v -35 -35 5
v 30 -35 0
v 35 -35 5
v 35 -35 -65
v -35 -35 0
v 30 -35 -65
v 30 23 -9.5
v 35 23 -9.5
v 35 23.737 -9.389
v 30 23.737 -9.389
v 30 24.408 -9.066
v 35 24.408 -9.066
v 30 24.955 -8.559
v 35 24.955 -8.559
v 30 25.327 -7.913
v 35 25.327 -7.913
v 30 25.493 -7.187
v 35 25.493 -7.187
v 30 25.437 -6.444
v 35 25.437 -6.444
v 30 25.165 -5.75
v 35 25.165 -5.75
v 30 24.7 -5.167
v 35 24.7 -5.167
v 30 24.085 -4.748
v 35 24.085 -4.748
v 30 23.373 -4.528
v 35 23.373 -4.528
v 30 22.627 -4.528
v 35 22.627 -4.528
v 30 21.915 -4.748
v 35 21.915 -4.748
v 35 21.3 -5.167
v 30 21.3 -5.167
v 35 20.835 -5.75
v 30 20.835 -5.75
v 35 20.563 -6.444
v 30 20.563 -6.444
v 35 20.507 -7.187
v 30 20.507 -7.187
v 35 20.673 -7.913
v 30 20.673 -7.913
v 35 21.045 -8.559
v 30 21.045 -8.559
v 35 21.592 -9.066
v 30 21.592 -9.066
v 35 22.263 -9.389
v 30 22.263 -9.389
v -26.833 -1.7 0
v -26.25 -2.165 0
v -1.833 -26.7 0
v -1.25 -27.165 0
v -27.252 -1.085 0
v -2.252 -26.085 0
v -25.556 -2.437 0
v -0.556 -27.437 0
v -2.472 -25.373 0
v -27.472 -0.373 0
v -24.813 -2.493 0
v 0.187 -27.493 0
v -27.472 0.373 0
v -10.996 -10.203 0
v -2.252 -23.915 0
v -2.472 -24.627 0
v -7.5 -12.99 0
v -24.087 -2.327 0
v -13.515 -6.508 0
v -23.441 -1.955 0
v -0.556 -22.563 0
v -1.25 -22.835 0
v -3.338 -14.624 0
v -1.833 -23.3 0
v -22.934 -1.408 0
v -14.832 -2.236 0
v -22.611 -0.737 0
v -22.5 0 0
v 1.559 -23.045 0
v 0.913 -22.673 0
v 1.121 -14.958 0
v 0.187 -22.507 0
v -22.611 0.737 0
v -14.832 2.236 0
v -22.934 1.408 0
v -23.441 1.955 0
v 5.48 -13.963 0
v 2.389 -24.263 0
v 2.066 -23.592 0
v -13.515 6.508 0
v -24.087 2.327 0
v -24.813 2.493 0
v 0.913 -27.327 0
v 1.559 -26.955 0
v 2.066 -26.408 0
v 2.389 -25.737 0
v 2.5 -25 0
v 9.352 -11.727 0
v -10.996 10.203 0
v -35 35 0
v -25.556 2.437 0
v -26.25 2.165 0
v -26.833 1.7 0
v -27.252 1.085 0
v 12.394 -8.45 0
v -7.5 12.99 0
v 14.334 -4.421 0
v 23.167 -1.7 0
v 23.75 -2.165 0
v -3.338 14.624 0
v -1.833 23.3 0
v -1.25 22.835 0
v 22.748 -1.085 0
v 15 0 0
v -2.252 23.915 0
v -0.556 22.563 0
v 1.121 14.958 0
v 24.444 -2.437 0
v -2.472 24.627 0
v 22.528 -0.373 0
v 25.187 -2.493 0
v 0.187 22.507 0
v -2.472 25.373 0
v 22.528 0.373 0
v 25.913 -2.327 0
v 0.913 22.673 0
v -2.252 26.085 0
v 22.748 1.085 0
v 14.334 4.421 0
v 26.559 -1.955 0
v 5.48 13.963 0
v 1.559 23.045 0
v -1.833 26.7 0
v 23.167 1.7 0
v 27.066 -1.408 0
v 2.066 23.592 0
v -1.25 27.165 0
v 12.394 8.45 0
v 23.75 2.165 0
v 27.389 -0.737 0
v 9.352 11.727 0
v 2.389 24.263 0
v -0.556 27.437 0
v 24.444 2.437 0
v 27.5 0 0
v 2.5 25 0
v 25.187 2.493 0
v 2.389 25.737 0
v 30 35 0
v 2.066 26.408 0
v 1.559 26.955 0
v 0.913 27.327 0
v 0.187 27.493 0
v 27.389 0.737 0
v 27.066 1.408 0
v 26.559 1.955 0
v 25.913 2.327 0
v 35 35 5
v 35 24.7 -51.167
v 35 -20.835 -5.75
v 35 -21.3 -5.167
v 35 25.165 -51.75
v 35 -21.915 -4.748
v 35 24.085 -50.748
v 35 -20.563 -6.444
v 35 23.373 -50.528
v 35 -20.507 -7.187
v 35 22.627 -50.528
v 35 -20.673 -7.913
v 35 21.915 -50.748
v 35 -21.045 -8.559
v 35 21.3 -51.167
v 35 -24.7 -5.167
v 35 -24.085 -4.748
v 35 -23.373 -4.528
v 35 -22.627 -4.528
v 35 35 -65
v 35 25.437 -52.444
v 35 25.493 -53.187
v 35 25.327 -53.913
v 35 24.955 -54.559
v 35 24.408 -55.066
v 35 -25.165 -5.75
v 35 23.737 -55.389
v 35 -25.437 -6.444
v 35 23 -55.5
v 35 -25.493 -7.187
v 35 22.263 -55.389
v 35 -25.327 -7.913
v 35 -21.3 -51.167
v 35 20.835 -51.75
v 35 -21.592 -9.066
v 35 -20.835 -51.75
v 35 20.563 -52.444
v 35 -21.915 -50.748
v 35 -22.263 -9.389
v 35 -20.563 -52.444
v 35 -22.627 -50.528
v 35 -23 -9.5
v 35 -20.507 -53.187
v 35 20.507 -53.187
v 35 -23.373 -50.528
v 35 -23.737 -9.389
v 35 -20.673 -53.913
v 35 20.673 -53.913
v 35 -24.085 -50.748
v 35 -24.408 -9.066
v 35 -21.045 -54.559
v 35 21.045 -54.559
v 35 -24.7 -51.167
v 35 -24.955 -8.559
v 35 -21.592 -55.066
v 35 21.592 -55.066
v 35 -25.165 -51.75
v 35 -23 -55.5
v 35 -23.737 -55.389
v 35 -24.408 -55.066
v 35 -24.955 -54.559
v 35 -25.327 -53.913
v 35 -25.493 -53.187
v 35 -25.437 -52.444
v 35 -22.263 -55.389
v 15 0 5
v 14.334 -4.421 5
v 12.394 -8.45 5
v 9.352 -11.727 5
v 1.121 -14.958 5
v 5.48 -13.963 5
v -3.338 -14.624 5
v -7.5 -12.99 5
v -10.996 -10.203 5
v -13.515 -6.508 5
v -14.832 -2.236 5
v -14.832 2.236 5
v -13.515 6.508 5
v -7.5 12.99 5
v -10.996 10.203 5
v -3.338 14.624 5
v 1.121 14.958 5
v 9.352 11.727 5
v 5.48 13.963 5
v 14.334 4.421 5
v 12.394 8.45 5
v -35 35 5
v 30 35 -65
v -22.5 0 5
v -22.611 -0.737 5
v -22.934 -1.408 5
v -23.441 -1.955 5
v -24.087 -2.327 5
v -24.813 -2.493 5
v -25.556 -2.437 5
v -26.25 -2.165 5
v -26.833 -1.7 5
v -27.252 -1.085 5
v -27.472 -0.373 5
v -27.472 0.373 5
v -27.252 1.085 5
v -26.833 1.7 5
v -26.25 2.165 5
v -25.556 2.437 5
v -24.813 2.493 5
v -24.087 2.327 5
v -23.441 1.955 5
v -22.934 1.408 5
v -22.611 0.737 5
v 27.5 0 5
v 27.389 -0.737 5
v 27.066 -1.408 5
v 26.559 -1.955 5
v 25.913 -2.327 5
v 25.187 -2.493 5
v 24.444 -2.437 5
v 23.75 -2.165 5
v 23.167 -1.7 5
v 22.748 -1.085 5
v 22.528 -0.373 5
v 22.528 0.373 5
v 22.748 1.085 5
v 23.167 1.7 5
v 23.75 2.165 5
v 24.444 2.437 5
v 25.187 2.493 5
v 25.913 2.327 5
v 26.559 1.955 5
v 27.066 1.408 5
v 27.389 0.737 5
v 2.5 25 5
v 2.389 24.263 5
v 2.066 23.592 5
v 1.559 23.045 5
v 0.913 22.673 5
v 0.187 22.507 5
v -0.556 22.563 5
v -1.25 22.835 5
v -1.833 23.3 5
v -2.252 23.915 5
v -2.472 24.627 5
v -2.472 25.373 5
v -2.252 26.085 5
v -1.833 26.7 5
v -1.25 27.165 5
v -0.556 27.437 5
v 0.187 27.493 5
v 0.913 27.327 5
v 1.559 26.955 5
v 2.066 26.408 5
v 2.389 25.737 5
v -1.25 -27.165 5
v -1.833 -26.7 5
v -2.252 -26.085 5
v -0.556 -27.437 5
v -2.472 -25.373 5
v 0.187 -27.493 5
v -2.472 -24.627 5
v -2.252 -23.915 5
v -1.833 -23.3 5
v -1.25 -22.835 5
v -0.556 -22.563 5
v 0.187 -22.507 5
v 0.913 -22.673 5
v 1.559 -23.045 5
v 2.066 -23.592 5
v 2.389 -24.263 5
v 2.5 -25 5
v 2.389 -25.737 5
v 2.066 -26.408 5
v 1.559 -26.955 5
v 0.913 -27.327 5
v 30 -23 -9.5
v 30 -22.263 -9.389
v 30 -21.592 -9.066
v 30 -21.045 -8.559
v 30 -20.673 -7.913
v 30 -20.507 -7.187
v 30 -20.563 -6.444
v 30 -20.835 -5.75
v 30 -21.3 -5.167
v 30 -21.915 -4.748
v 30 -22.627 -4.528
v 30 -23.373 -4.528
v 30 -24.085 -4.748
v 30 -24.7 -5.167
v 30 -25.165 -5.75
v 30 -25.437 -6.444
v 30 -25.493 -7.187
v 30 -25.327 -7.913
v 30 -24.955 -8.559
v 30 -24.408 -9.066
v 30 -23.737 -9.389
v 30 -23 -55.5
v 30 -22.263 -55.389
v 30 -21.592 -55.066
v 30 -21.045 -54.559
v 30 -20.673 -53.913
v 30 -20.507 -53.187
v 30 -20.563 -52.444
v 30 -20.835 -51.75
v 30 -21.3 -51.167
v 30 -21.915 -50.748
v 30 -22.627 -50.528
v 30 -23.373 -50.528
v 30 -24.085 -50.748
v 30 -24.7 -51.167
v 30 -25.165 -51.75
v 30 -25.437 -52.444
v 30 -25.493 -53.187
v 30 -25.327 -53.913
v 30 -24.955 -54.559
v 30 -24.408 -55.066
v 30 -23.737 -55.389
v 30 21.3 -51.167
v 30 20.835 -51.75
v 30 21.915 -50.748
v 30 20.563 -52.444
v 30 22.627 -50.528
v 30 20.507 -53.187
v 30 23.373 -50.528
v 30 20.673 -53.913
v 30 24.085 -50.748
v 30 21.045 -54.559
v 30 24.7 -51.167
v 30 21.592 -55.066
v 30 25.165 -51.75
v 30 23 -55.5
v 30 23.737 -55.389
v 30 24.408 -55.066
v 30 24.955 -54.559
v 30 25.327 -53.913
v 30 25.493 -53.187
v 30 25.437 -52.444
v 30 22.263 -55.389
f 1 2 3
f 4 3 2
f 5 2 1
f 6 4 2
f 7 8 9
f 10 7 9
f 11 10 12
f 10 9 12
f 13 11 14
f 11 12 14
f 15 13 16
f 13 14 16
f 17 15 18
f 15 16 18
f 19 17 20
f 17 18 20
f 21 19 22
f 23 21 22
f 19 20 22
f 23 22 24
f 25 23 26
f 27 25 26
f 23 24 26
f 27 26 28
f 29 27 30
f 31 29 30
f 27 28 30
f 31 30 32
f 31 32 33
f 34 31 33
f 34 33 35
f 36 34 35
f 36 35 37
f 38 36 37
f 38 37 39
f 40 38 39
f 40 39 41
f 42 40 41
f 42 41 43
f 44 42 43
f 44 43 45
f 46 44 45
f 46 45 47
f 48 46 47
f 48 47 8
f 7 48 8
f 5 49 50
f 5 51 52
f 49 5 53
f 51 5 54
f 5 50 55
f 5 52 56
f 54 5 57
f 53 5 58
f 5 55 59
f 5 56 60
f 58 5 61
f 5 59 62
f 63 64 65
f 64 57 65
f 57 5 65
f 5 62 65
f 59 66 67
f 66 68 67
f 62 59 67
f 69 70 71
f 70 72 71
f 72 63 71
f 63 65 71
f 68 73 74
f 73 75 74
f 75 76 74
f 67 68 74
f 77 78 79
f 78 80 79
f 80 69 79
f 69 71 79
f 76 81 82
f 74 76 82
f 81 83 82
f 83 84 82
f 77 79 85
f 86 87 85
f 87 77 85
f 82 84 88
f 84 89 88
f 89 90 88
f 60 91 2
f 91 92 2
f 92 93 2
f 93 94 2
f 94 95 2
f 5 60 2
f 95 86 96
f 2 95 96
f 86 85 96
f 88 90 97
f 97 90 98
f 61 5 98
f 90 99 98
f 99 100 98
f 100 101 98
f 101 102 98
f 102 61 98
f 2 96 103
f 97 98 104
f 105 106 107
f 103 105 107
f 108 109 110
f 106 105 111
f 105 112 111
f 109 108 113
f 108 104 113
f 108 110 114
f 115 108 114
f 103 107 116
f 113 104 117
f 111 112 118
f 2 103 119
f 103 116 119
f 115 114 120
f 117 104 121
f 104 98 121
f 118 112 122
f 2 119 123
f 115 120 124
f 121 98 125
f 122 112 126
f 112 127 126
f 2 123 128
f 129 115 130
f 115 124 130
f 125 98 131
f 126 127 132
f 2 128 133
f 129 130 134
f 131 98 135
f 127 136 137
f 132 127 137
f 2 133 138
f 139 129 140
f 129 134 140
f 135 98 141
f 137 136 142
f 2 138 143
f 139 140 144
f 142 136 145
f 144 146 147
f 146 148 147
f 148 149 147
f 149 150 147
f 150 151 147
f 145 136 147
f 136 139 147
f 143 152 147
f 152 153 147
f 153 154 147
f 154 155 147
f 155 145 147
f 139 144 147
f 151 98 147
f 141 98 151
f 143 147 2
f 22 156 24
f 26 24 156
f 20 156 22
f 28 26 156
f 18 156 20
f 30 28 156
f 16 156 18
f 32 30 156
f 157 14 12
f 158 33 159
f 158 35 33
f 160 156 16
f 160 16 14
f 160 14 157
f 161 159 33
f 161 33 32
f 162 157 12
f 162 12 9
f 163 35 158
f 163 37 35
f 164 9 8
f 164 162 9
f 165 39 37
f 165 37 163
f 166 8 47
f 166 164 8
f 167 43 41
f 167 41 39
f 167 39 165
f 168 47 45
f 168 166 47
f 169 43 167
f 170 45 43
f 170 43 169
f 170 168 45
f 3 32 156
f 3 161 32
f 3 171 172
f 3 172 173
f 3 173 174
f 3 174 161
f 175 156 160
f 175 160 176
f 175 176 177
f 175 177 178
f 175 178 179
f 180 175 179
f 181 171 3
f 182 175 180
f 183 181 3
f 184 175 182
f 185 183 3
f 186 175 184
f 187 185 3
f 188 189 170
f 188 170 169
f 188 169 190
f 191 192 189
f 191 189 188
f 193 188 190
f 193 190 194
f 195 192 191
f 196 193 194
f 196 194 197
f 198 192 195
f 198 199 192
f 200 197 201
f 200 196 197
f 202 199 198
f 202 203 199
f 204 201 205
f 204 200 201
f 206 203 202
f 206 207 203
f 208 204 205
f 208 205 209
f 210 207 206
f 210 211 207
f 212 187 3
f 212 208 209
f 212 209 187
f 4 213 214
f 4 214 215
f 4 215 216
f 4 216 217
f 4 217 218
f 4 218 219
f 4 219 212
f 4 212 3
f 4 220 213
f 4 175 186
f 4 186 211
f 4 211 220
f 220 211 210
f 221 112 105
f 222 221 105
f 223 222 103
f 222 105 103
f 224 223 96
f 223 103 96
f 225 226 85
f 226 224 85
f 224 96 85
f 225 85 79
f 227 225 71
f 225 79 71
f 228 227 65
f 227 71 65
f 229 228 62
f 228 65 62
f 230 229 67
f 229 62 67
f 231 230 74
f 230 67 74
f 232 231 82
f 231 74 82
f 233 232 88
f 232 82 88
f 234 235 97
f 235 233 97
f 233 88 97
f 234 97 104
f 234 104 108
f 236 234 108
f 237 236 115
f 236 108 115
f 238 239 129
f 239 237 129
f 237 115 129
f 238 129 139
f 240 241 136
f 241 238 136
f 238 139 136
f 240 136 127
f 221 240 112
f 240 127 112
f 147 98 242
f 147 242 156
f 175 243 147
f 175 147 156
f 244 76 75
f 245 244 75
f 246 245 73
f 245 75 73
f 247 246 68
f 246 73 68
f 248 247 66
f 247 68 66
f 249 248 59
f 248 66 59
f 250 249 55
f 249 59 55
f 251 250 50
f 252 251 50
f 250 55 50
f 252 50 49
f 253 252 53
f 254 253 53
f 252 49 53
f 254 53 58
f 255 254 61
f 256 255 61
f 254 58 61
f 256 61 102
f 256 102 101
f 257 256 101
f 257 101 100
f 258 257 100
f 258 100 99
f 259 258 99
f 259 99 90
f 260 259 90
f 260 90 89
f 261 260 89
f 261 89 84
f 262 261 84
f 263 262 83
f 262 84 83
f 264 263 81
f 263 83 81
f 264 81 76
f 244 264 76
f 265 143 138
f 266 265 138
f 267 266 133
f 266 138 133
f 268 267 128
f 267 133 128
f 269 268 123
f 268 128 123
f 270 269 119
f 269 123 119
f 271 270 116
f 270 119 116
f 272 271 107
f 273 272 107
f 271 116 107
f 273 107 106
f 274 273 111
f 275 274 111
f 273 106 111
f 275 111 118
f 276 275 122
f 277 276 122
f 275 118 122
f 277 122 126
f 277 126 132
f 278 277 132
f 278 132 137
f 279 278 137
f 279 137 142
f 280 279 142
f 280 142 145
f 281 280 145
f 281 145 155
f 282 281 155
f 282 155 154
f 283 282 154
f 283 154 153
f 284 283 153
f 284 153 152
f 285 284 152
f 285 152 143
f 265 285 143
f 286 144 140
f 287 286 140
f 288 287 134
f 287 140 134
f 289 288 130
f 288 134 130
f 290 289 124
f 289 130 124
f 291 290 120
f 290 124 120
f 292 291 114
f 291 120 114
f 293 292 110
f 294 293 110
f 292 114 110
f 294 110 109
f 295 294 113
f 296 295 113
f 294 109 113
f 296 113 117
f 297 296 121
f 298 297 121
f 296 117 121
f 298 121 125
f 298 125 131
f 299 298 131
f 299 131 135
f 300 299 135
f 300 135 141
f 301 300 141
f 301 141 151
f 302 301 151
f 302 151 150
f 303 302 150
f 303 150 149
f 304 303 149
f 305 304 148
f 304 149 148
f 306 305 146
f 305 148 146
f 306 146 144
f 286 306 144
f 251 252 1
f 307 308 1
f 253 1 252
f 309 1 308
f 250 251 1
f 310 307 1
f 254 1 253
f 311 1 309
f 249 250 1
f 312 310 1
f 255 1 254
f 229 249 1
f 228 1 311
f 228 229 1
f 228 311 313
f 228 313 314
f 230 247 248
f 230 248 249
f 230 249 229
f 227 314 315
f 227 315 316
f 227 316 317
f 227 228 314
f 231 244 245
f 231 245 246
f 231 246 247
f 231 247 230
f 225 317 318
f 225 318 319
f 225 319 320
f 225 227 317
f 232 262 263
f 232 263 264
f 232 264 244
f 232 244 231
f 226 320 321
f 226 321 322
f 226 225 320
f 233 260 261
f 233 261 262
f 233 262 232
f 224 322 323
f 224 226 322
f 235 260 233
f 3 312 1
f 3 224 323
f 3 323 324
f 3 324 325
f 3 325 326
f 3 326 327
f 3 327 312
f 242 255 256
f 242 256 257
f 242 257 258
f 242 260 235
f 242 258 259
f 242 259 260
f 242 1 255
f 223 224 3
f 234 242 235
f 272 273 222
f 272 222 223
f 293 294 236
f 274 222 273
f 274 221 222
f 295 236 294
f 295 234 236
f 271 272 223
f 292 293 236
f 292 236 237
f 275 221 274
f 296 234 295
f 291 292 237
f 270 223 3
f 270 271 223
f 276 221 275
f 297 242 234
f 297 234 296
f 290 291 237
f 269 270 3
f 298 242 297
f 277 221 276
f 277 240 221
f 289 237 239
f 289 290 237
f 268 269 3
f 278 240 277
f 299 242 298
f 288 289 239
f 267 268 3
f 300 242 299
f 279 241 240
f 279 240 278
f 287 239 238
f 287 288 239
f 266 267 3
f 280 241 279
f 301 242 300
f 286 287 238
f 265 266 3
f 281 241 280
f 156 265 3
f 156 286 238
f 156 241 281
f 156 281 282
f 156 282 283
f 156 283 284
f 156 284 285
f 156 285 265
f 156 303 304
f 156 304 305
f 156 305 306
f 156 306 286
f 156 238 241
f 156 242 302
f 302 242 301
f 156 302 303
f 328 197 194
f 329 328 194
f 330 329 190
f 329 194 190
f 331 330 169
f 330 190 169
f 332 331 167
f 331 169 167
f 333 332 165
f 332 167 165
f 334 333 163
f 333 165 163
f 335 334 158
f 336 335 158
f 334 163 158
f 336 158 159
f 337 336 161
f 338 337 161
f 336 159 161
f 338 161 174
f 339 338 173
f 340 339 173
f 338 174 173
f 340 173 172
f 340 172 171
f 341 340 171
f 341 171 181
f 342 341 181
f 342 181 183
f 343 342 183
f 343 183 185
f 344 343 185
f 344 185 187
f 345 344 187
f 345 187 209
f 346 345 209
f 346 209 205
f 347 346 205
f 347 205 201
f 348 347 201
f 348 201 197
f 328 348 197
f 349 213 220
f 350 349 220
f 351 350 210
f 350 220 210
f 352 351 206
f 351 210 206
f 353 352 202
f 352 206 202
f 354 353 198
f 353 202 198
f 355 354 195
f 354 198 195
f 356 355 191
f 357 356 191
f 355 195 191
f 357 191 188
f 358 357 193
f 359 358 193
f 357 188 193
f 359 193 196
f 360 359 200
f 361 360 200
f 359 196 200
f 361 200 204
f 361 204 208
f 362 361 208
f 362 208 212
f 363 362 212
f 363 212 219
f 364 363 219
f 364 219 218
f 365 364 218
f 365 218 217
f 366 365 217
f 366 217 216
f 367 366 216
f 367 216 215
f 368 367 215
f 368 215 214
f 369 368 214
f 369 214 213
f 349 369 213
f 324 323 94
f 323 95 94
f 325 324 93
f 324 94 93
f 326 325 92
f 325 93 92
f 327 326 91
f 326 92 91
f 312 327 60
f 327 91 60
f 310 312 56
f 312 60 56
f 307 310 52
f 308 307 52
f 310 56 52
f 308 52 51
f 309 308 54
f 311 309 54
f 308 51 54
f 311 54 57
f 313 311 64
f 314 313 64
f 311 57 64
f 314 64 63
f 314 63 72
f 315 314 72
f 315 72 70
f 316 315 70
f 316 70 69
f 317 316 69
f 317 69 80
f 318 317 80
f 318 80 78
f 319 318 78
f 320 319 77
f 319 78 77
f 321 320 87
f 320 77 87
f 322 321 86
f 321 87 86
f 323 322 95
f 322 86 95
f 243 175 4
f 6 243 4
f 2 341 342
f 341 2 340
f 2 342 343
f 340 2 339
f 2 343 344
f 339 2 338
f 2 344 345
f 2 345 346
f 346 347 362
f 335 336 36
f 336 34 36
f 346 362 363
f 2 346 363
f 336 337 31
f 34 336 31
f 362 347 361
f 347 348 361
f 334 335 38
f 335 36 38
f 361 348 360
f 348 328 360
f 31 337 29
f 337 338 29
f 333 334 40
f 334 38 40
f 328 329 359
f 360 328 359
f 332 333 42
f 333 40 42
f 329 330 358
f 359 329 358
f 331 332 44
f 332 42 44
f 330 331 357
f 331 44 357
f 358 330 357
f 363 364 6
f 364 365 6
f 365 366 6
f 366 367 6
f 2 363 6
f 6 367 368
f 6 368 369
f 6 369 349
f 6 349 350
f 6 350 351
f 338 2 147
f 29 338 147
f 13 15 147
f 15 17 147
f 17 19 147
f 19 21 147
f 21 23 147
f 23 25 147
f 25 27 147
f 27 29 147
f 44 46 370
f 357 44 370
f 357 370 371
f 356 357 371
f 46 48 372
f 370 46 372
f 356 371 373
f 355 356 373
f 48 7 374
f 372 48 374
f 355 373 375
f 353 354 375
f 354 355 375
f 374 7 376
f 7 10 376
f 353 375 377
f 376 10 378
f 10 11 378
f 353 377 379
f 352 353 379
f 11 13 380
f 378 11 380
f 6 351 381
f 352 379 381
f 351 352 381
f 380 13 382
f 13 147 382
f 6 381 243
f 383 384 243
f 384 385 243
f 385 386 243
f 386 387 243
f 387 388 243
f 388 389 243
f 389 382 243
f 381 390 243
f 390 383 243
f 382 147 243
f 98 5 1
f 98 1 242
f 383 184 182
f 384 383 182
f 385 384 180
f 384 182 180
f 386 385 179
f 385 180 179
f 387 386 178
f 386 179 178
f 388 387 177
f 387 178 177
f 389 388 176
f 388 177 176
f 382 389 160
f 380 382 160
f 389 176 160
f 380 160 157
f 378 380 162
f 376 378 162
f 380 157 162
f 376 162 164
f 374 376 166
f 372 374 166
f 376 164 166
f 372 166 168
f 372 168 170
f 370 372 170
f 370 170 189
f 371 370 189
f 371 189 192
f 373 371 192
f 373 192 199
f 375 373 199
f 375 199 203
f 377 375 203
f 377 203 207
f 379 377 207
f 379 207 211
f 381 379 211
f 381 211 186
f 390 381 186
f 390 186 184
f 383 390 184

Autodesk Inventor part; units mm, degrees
ref_plane "YZ Plane" through (0, 0, 0) normal (1, 0, 0) x (0, 1, 0)
ref_plane "XZ Plane" through (0, 0, 0) normal (0, 1, 0) x (-1, 0, 0)
ref_plane "XY Plane" through (0, 0, 0) normal (0, 0, 1) x (1, 0, 0)
sketch "Sketch1" plane through (0, 0, 0) normal (0, 0, 1) x (1, 0, 0)
  line L0 (-35, 35) -> (35, 35)
  line L1 (35, 35) -> (35, -35)
  line L2 (35, -35) -> (-35, -35)
  line L3 (-35, -35) -> (-35, 35)
  line L4 (-35, 35) -> (35, -35) construction
  line L5 (35, 35) -> (-35, -35) construction
  circle A0 centre (0, 0) radius 15
  circle A1 centre (0, 0) radius 25
  circle A2 centre (-25, 0) radius 2.5
  circle A3 centre (0, -25) radius 2.5
  circle A4 centre (25, 0) radius 2.5
  circle A5 centre (0, 25) radius 2.5
  dimension "d3" = 50
  dimension "d0" = 70
  dimension "d1" = 70
  dimension "d2" = 30
  dimension "d4" = 5
  dimension "d7" = 360
extrude "Extrusion1" add sketch "Sketch1" along normal blind 5 contours L0 L1 L2 L3 | A4 A1 A3 A2 A5
sketch "Sketch2" plane through (35, -35, 0) normal (1, 0, 0) x (0, 0, -1)
  line L0 (-5, 0) -> (-5, 70) projected
  line L1 (-5, 70) -> (65, 70)
  line L2 (65, 70) -> (65, 0)
  line L3 (65, 0) -> (-5, 0)
  line L4 (-5, 0) -> (-5, 70)
  point P0 (0, 35)
  dimension "d11" = 70
  dimension "d12" = 70
extrude "Extrusion2" add sketch "Sketch2" against normal blind 5
sketch "Sketch3" plane through (35, -35, 5) normal (1, 0, 0) x (0, 0, -1)
  line L0 (70, 70) -> (0, 70) projected
  line L1 (0, 0) -> (0, 70) projected
  line L2 (70, 0) -> (0, 0) projected
  line L3 (70, 0) -> (70, 70) projected
  line L4 (12, 58) -> (58, 58)
  line L5 (58, 58) -> (58, 12)
  line L6 (58, 12) -> (12, 12)
  line L7 (12, 12) -> (12, 58)
  circle A0 centre (12, 58) radius 2.5
  circle A1 centre (58, 58) radius 2.5
  circle A2 centre (12, 12) radius 2.5
  circle A3 centre (58, 12) radius 2.5
  point P0 (5, 35)
  dimension "d15" = 12
  dimension "d16" = 5
  dimension "d19" = 46
  dimension "d22" = 46
extrude "Extrusion3" cut sketch "Sketch3" against normal blind 5 contours L7 A0 L4 | L4 A0 L7 | A1 L5 L4 | L4 L5 A1 | A2 L6 L7 | L7 L6 A2 | A3 L6 L5 | L5 L6 A3
properties part number "SOPORTE DE MOTOR"
